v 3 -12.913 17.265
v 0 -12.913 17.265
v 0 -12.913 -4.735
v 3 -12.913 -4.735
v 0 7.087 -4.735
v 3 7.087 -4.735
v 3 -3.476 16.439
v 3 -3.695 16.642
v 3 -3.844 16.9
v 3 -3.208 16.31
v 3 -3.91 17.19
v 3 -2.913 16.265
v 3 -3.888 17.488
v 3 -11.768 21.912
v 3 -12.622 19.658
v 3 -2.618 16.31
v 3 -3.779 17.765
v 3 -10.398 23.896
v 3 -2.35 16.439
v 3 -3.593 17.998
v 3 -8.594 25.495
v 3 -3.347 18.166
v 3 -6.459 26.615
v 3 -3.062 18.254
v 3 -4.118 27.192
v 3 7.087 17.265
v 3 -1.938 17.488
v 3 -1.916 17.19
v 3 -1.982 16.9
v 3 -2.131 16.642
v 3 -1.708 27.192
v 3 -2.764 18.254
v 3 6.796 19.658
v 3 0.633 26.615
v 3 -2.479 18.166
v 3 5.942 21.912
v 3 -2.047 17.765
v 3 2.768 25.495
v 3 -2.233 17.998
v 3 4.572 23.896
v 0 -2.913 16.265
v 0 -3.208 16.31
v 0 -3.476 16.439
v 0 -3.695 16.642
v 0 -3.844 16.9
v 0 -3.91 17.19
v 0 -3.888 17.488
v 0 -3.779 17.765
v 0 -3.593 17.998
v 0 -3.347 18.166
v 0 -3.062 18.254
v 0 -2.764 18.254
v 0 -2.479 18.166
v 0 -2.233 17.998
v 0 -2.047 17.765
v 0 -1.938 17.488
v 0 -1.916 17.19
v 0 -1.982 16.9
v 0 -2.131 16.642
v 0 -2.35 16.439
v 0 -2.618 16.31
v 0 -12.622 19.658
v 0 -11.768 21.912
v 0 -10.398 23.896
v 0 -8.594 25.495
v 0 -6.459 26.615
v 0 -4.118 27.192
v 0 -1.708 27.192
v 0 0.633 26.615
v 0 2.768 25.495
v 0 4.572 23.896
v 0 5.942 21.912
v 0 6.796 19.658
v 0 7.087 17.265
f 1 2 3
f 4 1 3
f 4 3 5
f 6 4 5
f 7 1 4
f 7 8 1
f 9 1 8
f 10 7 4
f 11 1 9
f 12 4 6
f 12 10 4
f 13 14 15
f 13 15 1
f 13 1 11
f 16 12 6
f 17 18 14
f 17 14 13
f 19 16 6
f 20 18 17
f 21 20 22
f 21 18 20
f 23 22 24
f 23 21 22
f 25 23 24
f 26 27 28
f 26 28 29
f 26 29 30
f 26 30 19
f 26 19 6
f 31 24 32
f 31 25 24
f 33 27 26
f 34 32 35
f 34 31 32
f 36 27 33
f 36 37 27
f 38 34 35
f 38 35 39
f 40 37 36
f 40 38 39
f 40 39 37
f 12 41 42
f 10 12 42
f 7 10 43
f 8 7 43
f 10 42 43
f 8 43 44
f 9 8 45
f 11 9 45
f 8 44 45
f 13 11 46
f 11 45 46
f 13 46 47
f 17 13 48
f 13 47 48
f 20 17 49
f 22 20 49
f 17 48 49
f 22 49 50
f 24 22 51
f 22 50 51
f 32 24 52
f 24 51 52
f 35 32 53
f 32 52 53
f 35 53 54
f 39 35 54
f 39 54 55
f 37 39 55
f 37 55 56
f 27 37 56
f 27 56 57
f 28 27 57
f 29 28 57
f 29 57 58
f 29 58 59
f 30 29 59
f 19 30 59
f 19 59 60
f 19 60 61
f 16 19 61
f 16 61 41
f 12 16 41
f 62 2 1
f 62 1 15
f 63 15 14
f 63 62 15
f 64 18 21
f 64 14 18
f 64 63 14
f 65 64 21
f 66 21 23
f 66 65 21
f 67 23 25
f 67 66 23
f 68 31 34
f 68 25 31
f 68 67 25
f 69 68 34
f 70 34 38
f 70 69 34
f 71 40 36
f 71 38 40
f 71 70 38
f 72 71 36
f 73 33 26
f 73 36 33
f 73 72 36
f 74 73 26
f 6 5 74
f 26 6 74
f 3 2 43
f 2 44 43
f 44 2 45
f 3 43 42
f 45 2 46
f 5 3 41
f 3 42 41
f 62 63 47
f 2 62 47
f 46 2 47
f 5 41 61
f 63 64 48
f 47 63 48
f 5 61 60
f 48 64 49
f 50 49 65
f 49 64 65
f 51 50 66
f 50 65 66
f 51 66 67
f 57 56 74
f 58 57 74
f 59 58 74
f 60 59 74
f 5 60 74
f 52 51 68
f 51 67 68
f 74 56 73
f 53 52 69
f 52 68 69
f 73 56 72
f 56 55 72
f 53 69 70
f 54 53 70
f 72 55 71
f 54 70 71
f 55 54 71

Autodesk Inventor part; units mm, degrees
ref_plane "YZ Plane" through (0, 0, 0) normal (1, 0, 0) x (0, 1, 0)
ref_plane "XZ Plane" through (0, 0, 0) normal (0, 1, 0) x (-1, 0, 0)
ref_plane "XY Plane" through (0, 0, 0) normal (0, 0, 1) x (1, 0, 0)
sketch "スケッチ1" plane through (0, 0, 0) normal (1, 0, 0) x (0, 1, 0)
  line L0 (7.087, 17.2652) -> (-12.913, 17.2652)
  line L1 (-12.913, 17.2652) -> (-12.913, -4.7348)
  line L2 (-12.913, -4.7348) -> (7.087, -4.7348)
  line L3 (7.087, -4.7348) -> (7.087, 17.2652)
  arc A0 (7.087, 17.2652) -> (-12.913, 17.2652) centre (-2.913, 17.2652) ccw
  point P0 (0, 0)
  dimension "d0" = 20
  dimension "d1" = 22
extrude "押し出し1" add sketch "スケッチ1" along normal blind 3
sketch "スケッチ2" plane through (3, 0, 0) normal (1, 0, 0) x (0, 0, -1)
  arc A0 (-17.2652, 7.087) -> (-17.2652, -12.913) centre (-17.2652, -2.913) ccw projected
  circle A1 centre (-17.2652, -2.913) radius 1
  point P0 (0, 0)
  dimension "d4" = 2
hole "穴1" at (3, -2.913, 17.2652) direction (-1, 0, 0) diameter 2 depth 10
equation "\"BendRadius\" = Thickness"
equation "\"BendReliefWidth\" = Thickness"
equation "\"BendReliefDepth\" = 0.5 * Thickness"
equation "\"CornerReliefSize\" = 4 * Thickness"
equation "\"MinimumRemnant\" = 2 * Thickness"
equation "\"TransitionRadius\" = BendRadius"
equation "\"JacobiRadiusSize\" = BendRadius"
equation "\"GapSize\" = Thickness"
equation "\"Thickness\" = 0.5"
